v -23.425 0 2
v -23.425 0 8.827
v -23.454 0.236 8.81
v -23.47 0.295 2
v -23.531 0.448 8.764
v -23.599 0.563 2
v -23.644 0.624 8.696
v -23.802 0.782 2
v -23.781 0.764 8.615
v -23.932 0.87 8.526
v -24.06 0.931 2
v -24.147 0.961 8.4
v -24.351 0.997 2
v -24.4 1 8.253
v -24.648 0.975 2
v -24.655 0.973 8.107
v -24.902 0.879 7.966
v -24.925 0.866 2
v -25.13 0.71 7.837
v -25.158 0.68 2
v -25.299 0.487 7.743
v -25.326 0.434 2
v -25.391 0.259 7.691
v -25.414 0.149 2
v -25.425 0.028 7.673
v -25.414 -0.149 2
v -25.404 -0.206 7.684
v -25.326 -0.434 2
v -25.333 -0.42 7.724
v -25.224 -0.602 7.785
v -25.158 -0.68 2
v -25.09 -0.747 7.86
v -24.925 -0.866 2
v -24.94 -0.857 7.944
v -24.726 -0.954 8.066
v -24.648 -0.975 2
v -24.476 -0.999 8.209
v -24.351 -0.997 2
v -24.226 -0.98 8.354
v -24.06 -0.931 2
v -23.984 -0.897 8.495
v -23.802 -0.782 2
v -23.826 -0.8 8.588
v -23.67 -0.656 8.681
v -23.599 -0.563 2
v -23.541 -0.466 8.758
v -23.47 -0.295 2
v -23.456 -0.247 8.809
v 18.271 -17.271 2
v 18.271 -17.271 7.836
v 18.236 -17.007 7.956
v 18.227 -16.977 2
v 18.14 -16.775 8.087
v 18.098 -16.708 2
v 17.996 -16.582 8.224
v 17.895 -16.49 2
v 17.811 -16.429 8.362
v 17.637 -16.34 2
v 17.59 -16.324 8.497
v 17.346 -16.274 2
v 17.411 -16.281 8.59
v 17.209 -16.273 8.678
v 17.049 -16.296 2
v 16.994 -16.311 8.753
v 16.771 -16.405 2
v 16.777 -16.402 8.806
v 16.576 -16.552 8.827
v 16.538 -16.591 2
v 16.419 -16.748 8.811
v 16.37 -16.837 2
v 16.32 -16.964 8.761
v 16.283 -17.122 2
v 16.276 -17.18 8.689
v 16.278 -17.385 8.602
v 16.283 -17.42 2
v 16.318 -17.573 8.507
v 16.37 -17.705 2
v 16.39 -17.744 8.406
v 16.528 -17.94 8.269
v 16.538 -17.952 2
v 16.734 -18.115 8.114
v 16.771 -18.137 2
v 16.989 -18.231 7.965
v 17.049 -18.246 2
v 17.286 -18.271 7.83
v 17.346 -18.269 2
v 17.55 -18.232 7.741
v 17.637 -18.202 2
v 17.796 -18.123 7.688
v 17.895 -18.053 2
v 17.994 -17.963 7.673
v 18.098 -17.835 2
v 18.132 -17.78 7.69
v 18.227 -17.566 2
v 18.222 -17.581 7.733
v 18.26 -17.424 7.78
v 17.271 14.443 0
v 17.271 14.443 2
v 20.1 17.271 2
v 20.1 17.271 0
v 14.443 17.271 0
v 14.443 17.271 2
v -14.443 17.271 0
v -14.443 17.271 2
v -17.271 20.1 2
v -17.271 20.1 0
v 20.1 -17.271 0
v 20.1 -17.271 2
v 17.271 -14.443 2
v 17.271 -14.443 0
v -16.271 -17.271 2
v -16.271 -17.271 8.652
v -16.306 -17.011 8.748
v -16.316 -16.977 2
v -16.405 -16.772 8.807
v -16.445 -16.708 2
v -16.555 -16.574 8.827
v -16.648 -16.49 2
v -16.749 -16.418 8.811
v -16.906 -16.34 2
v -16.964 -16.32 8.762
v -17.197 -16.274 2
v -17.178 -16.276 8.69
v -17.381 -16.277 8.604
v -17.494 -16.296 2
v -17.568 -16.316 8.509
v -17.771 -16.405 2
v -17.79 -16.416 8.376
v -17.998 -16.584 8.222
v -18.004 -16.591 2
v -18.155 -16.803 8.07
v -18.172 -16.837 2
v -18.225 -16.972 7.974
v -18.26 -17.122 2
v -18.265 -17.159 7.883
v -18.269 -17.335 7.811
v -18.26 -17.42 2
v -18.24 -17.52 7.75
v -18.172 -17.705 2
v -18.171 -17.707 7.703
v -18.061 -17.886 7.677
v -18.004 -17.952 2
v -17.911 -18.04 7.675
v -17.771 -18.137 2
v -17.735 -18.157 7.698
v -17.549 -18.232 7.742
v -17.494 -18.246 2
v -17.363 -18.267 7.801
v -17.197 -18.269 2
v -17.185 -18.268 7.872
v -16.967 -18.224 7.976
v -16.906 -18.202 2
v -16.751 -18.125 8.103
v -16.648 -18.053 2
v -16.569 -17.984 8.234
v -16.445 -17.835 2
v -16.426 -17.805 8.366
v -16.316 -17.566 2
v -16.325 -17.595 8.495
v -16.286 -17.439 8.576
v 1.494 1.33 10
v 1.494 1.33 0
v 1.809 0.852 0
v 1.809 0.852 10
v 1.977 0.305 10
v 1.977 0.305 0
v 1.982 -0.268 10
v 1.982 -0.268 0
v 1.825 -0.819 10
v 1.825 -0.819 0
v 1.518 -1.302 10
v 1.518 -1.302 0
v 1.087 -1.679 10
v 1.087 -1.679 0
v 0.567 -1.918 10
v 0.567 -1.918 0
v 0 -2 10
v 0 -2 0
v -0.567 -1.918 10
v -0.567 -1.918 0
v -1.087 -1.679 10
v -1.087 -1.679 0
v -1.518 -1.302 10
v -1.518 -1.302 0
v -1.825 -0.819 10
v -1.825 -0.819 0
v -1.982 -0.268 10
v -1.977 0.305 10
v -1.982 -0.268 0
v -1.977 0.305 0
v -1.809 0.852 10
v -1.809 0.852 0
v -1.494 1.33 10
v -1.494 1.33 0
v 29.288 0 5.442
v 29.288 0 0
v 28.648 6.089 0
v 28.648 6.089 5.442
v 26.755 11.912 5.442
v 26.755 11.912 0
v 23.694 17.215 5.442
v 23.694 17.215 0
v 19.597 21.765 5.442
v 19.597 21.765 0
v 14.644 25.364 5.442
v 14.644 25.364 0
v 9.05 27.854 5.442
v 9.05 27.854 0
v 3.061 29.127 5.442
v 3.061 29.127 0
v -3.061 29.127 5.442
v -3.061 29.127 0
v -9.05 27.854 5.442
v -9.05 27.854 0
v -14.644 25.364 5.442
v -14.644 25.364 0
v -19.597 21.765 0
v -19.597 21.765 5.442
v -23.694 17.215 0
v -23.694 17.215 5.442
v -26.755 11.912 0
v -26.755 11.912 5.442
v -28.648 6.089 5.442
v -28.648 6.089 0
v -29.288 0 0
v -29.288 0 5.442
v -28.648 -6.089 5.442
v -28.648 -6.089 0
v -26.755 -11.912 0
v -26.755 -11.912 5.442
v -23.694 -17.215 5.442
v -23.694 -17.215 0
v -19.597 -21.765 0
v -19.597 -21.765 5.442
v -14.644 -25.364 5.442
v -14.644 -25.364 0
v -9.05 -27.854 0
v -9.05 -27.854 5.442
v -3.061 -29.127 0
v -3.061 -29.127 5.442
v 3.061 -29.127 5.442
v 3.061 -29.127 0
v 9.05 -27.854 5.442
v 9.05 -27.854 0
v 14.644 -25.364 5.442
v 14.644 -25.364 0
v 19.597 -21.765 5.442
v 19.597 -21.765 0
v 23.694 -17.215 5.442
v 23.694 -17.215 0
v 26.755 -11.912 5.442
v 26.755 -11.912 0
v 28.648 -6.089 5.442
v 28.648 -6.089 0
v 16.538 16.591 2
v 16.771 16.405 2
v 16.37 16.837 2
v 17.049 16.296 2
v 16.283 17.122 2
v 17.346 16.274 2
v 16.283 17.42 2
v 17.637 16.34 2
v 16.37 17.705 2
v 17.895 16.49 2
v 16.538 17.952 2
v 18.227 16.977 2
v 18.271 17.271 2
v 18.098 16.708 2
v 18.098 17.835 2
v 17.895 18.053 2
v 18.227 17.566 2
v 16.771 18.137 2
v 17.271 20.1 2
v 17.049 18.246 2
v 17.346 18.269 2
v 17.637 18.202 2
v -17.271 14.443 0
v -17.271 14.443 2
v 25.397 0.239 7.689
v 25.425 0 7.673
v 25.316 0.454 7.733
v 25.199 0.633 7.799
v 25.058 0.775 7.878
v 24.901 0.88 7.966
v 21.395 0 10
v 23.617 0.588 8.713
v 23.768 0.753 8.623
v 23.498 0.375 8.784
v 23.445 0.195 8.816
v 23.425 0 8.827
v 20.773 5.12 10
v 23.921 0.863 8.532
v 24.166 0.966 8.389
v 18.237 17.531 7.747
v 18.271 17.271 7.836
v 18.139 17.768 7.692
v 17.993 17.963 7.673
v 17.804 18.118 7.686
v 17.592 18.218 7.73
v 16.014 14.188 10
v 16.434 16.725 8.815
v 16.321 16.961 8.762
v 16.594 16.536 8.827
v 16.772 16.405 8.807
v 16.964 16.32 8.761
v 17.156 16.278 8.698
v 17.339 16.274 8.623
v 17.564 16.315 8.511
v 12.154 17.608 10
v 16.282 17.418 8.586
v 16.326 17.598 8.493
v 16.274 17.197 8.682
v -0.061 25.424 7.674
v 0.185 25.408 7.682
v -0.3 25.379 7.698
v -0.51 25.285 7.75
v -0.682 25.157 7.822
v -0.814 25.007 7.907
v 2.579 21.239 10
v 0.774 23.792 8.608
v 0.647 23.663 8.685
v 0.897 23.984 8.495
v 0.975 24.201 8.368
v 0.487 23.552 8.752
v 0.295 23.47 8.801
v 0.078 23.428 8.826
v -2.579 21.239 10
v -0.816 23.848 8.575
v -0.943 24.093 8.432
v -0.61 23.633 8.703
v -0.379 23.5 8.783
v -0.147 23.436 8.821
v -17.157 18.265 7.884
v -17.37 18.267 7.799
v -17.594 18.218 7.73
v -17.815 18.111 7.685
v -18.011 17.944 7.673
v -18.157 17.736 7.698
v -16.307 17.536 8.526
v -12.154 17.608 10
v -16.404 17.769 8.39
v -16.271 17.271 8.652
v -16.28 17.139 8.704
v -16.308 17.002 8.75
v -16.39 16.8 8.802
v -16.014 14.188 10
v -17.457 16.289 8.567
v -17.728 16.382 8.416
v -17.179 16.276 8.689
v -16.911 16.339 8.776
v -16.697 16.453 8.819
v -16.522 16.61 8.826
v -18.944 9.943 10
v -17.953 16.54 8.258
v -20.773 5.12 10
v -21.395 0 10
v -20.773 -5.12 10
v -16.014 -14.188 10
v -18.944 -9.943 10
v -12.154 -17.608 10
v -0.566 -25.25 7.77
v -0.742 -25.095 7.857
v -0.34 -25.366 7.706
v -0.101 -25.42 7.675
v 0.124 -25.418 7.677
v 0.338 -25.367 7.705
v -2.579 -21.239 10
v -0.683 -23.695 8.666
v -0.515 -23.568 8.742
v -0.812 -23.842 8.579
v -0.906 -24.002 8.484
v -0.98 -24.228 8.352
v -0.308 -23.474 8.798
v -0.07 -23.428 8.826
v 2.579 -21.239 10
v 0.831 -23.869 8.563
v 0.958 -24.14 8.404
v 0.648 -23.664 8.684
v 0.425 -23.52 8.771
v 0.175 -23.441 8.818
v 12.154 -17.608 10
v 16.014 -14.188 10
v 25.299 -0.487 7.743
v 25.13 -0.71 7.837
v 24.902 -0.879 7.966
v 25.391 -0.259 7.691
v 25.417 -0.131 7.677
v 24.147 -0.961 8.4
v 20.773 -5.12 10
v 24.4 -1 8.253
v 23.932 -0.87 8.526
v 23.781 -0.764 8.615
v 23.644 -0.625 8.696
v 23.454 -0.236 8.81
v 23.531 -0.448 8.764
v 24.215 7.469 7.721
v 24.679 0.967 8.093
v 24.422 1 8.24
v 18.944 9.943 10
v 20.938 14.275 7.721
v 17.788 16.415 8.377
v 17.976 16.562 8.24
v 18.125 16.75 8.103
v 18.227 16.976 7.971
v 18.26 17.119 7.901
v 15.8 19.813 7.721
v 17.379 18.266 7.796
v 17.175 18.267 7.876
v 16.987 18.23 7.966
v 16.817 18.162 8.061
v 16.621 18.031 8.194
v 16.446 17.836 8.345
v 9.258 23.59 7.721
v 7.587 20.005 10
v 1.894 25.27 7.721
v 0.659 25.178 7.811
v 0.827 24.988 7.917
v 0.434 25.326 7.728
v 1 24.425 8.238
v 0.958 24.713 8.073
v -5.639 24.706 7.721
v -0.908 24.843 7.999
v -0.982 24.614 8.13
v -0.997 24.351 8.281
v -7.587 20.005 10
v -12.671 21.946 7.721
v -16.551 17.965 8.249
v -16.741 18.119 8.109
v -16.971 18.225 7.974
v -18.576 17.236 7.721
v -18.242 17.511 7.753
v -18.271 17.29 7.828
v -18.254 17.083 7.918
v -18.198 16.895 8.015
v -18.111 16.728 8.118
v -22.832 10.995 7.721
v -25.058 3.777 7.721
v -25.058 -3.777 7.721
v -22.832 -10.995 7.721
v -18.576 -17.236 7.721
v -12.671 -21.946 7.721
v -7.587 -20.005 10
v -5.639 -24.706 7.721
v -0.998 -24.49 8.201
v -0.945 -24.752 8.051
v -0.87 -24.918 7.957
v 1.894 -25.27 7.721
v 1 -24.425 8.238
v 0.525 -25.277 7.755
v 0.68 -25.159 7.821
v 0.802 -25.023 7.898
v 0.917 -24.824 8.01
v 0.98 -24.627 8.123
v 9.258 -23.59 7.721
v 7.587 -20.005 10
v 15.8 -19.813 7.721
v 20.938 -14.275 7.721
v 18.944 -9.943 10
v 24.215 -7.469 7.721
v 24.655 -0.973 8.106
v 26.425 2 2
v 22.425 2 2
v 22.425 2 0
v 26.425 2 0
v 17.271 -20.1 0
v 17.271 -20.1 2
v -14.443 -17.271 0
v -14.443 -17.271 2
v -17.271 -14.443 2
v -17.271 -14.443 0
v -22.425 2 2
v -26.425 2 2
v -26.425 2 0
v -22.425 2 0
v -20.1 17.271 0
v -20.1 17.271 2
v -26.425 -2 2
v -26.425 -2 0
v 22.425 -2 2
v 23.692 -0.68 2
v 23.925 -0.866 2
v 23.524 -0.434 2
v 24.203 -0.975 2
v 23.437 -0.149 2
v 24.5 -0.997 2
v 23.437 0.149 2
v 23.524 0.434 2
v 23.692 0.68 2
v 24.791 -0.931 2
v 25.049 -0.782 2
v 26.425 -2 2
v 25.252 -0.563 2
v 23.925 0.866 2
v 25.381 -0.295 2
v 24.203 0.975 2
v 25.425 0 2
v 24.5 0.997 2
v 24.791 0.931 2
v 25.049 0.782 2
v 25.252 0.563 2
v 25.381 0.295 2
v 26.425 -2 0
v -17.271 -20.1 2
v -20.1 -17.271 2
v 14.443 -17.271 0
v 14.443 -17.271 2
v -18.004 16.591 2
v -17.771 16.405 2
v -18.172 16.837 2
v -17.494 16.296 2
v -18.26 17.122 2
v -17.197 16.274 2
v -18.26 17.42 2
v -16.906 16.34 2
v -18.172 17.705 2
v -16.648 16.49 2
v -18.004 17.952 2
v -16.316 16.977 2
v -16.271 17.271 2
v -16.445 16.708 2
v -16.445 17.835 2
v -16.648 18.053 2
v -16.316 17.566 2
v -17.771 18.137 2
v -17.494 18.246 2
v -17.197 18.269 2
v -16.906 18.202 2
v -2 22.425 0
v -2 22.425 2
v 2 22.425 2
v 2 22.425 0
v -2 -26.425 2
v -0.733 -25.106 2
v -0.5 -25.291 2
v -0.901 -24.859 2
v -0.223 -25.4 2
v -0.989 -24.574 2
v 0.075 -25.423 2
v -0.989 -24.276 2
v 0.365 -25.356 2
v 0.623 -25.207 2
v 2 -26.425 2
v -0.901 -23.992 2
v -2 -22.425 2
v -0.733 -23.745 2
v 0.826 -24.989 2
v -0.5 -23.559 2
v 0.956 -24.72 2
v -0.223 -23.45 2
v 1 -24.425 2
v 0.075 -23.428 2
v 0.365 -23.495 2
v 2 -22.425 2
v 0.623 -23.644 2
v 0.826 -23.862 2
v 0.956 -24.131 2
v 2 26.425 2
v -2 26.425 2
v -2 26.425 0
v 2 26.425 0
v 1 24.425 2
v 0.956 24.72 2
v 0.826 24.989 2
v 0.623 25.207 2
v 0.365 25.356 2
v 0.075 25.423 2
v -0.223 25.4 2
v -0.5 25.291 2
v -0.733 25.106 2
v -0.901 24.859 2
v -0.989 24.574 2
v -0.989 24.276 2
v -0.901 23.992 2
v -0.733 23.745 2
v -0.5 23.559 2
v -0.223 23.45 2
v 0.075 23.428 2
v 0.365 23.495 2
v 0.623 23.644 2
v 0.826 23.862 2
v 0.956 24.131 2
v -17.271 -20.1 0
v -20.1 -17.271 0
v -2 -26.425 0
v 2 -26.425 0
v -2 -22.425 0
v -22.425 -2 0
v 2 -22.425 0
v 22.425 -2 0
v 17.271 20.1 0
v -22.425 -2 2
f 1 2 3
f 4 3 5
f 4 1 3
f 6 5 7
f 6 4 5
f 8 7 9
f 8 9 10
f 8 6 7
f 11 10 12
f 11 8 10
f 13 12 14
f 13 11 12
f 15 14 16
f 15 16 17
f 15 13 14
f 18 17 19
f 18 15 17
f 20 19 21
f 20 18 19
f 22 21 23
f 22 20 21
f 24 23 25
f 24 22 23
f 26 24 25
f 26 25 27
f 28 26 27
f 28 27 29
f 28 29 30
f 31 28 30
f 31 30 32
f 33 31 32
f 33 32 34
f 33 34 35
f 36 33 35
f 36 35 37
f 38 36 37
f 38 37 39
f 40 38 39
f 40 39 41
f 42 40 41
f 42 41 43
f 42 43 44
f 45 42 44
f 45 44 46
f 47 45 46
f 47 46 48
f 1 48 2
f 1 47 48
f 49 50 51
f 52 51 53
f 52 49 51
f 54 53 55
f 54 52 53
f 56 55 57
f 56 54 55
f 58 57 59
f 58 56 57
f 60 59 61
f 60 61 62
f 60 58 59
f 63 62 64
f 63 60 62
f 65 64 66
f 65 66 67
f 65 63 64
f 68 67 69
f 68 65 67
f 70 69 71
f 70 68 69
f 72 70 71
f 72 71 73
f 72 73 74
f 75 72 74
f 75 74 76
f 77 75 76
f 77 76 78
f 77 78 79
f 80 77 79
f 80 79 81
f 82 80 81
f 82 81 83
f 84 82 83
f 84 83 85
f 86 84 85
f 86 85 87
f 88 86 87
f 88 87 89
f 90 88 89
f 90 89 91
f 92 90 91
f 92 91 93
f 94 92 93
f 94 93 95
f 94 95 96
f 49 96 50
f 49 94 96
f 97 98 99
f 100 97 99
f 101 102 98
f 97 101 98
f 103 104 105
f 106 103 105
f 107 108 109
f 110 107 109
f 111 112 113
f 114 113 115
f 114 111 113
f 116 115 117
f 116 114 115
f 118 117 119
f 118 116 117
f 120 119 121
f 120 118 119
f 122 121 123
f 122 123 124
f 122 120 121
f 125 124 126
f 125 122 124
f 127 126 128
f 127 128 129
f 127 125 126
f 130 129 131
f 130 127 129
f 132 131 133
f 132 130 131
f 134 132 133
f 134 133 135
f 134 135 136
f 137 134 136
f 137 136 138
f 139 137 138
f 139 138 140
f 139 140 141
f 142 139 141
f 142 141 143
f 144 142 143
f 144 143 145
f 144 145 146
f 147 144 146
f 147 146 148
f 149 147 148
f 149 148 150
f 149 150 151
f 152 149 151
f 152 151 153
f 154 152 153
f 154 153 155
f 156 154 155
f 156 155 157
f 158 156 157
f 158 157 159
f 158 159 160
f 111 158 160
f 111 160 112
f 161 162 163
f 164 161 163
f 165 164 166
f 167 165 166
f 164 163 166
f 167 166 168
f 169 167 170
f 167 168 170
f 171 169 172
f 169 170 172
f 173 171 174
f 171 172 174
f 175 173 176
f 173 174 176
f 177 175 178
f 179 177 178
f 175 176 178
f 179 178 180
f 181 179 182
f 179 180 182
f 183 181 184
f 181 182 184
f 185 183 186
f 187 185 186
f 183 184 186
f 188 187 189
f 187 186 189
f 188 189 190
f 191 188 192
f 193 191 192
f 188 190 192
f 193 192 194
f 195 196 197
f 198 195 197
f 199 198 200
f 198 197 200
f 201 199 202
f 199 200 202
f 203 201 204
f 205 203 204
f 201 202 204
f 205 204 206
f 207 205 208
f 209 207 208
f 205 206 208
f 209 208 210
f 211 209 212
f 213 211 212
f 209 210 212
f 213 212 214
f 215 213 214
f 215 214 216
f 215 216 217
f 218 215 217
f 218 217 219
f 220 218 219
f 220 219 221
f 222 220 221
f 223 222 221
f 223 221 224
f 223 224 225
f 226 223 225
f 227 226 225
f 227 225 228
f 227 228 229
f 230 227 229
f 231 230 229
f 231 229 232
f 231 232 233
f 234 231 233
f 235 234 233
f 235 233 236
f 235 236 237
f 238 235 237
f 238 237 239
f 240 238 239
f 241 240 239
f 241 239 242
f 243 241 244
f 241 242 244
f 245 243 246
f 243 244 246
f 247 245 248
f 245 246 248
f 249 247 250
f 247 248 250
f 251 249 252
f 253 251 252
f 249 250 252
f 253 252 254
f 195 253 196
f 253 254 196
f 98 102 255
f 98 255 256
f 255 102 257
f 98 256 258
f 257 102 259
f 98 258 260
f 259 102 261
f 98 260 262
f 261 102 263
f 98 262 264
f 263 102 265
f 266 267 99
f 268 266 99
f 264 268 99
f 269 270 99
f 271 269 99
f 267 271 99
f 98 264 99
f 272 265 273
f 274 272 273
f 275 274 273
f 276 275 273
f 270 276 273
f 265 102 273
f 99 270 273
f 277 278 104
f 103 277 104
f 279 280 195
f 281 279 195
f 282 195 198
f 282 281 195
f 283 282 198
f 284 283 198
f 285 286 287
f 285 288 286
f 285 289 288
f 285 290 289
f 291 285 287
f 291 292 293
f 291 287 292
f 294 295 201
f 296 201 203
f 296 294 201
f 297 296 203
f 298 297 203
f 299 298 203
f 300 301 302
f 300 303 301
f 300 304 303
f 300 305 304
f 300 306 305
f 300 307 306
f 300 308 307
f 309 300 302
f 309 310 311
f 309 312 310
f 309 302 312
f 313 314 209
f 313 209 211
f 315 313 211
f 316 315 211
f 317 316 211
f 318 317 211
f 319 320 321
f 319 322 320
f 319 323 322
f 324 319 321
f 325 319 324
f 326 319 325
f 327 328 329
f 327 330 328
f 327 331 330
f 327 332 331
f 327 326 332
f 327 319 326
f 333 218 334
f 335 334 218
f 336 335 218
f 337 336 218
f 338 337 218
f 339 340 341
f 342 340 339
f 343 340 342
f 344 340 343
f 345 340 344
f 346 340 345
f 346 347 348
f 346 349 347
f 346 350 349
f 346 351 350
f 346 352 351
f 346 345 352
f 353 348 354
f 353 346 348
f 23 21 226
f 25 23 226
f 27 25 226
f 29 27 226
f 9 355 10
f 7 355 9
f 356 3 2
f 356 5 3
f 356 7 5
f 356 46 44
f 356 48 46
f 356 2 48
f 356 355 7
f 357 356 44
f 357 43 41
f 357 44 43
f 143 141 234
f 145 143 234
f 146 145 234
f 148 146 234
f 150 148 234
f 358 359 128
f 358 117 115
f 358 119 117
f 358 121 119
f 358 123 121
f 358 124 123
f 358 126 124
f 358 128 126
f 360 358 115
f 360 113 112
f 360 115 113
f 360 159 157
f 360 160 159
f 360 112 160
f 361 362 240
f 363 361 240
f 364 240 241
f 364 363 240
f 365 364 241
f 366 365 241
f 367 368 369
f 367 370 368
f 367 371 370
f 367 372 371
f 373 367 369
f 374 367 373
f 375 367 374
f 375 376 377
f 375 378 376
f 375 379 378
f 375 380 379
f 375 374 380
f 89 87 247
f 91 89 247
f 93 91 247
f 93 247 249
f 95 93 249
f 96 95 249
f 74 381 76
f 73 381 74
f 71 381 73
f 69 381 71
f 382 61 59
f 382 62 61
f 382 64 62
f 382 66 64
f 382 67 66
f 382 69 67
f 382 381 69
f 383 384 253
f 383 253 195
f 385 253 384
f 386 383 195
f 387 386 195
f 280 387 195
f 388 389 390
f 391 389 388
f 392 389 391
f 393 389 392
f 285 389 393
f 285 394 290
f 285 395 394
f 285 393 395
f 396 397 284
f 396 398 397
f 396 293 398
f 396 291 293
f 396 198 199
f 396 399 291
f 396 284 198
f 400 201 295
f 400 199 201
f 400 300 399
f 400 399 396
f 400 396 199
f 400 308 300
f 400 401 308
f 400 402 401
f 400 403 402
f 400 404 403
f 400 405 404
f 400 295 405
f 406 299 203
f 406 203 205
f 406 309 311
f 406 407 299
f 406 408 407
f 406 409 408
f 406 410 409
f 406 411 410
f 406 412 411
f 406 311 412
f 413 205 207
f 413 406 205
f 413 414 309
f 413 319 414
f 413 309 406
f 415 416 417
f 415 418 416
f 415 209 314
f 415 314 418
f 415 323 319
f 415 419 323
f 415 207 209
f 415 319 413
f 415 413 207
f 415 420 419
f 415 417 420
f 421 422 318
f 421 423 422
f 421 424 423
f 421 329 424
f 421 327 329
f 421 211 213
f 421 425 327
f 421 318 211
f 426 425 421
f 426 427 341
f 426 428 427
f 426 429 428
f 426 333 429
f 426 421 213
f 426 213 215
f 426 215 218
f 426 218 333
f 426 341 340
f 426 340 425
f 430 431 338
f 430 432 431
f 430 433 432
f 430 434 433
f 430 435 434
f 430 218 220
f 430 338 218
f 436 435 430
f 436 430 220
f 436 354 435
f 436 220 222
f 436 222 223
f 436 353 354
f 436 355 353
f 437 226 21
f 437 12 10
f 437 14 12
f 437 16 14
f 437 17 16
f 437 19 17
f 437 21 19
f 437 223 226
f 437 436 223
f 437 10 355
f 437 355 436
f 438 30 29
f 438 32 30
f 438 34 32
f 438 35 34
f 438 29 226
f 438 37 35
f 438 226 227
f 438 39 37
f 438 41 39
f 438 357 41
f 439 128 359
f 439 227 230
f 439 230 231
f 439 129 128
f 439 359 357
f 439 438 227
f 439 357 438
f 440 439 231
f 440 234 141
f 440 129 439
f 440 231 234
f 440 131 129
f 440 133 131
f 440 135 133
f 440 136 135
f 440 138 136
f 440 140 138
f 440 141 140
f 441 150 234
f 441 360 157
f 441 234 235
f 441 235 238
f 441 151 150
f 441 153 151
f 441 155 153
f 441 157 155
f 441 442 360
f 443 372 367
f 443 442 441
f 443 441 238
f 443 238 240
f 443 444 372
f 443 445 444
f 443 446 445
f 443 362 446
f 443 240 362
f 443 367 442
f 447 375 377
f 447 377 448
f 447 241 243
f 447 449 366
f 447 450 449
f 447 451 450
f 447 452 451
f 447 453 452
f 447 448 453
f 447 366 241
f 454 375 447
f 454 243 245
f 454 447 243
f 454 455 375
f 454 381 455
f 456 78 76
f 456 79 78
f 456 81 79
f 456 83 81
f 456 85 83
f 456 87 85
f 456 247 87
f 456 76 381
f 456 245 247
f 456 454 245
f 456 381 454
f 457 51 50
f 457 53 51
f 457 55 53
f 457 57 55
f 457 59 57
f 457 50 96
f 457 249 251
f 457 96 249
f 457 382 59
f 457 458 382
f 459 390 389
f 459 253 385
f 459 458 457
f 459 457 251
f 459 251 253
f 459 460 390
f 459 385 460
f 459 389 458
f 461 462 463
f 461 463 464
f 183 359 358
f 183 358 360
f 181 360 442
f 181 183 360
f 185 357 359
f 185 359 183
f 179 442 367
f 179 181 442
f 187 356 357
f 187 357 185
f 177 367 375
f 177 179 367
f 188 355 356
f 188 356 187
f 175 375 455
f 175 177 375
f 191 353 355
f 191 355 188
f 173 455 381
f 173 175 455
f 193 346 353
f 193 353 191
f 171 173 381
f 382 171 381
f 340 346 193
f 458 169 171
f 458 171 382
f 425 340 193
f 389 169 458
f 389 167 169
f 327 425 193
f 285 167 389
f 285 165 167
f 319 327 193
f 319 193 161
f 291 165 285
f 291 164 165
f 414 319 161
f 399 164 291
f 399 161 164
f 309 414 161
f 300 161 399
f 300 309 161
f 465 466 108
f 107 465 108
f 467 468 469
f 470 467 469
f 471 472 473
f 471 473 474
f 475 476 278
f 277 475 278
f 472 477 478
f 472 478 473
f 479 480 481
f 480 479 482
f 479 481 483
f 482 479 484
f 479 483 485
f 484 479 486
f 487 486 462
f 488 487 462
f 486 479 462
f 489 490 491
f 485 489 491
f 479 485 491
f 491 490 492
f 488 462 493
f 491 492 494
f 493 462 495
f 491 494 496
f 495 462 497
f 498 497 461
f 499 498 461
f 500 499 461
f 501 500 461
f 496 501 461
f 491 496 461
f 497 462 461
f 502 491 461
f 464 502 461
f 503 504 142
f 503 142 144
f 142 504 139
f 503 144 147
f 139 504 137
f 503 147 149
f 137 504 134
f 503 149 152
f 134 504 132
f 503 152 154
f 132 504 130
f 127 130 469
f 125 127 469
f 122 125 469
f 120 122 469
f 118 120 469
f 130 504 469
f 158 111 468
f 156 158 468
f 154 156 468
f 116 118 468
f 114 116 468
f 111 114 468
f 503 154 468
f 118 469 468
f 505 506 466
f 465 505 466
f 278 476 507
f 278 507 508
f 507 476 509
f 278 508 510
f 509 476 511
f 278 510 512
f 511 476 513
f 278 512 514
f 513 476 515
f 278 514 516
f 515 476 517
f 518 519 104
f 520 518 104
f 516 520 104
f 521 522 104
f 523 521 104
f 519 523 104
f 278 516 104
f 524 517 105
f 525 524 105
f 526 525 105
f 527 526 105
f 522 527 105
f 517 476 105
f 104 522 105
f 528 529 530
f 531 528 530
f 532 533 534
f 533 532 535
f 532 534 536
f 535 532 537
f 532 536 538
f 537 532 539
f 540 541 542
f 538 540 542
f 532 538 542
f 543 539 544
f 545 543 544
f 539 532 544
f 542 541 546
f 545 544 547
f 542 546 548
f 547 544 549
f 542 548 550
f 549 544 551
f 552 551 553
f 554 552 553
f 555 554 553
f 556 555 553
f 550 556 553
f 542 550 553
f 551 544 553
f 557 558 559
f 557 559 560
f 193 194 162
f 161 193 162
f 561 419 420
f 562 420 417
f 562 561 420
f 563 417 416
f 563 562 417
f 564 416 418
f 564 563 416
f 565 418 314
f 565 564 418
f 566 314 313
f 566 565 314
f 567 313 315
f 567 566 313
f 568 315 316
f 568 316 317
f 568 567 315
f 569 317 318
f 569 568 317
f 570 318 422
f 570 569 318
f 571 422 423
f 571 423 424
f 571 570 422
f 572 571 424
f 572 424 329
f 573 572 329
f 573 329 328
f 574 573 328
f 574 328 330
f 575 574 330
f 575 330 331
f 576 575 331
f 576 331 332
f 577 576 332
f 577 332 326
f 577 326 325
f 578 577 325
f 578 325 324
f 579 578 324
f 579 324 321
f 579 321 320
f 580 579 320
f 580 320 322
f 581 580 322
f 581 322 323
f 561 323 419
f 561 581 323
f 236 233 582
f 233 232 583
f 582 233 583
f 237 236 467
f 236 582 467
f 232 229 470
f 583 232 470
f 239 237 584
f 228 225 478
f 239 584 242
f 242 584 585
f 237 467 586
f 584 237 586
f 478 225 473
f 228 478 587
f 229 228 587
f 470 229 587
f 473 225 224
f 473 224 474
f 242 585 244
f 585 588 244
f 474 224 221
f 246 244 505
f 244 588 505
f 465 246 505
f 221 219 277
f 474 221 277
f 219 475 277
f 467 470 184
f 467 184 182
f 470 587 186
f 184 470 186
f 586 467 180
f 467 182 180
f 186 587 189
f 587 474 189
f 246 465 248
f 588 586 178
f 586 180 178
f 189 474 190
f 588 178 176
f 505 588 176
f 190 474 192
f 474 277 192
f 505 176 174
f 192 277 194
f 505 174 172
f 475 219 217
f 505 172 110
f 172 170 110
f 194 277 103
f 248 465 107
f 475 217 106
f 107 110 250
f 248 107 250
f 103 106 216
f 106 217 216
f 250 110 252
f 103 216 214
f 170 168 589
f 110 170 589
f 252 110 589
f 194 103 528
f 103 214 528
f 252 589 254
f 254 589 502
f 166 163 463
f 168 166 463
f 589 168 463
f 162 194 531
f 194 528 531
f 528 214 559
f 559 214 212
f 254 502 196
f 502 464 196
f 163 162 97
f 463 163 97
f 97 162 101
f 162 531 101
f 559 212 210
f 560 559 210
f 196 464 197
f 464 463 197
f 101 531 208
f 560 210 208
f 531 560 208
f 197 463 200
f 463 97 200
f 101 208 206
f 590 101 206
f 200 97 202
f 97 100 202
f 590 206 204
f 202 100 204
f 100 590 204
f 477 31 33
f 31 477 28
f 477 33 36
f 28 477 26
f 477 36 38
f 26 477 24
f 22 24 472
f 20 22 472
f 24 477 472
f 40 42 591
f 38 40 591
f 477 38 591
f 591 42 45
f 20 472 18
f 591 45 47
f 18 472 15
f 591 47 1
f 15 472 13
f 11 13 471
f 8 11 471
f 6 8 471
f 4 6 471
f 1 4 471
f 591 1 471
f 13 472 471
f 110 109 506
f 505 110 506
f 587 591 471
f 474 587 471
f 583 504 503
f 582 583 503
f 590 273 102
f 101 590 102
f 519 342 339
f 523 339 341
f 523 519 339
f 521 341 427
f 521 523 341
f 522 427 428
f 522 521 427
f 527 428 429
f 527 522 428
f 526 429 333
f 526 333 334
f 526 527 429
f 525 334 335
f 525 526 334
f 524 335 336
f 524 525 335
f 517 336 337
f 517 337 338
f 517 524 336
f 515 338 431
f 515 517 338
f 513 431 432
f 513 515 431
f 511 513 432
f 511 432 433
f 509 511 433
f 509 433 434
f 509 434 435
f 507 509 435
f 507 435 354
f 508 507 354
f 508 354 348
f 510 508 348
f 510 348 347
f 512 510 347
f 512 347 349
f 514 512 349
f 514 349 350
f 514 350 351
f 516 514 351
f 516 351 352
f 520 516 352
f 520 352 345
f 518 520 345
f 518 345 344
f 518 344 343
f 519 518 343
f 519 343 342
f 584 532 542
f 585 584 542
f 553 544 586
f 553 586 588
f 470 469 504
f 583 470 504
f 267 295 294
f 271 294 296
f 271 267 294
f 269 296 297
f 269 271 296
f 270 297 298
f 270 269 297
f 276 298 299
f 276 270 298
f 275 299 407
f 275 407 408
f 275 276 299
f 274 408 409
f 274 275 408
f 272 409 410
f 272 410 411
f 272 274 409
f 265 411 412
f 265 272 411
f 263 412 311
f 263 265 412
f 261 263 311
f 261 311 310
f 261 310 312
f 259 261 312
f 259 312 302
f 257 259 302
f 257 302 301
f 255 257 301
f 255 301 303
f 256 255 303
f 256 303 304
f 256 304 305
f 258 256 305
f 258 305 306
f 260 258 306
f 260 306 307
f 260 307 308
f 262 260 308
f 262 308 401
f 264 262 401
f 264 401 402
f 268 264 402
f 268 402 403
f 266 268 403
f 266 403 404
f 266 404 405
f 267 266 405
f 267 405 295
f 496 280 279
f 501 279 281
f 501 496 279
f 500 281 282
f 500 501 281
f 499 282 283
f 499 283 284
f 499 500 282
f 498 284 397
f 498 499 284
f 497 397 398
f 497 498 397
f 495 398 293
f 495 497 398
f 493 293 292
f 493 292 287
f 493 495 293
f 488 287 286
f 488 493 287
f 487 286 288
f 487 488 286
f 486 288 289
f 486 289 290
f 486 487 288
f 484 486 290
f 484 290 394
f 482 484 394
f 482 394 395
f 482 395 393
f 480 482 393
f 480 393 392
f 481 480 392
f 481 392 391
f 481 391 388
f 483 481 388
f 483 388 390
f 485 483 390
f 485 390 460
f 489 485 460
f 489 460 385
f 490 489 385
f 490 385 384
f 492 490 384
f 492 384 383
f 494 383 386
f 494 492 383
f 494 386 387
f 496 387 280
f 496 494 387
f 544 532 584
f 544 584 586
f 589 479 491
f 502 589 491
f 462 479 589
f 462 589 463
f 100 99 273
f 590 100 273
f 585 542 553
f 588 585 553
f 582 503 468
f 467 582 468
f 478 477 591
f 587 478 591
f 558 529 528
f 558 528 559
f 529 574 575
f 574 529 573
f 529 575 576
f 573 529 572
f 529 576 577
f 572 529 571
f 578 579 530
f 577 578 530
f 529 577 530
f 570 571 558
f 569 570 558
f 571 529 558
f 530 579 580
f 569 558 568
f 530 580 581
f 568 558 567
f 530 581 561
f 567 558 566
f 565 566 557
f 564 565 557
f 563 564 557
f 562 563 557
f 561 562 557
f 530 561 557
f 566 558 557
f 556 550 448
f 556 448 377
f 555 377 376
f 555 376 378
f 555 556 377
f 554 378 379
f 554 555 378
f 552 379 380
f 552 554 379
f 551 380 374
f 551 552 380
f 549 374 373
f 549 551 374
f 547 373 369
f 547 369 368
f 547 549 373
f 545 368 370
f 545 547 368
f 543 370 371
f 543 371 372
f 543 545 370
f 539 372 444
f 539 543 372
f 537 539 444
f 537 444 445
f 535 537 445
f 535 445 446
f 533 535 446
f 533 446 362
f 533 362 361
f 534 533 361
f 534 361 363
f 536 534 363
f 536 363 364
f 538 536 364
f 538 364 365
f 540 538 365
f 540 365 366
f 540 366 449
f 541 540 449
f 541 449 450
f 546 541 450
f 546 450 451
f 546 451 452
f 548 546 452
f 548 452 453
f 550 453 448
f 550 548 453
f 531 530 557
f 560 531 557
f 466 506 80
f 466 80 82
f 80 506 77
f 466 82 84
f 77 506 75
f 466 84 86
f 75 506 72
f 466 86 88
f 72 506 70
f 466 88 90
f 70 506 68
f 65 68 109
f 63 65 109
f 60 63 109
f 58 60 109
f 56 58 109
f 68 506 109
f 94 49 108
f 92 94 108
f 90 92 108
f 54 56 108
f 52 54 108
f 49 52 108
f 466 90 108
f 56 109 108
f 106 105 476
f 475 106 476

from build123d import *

# Parameters (mm, degrees)
F0_R     = 29.287505
F0_R_2   = 1
F1_DEPTH = 10
F4_W     = 4
F4_H     = 4
F4_R     = 1
F5_DEPTH = 2


# Not quite as in the source:
# - a fillet or chamfer that OpenCascade refuses, or shapes differently, is made with other operations: its cross-section is extruded or revolved along the edge and cut away or added


with BuildPart() as f1:
    # F0 (on Top) → F1 (new body)
    with BuildSketch(Plane.XY):
        Circle(F0_R)
        with Locations((-17.2713695087, -17.2713695087)):
            Circle(F0_R_2, mode=Mode.SUBTRACT)
        with Locations((0, -24.425405)):
            Circle(F0_R_2, mode=Mode.SUBTRACT)
        with Locations((-24.425405, 0)):
            Circle(F0_R_2, mode=Mode.SUBTRACT)
        with BuildLine():
            ThreePointArc((1.4936867141, 1.33), (0, -2), (-1.4936867141, 1.33))
            Line((-1.4936867141, 1.33), (1.4936867141, 1.33))
        make_face(mode=Mode.SUBTRACT)
        with Locations((17.2713695087, -17.2713695087)):
            Circle(F0_R_2, mode=Mode.SUBTRACT)
        with Locations((24.425405, 0)):
            Circle(F0_R_2, mode=Mode.SUBTRACT)
        with Locations((-17.2713695087, 17.2713695087)):
            Circle(F0_R_2, mode=Mode.SUBTRACT)
        with Locations((0, 24.425405)):
            Circle(F0_R_2, mode=Mode.SUBTRACT)
        with Locations((17.2713695087, 17.2713695087)):
            Circle(F0_R_2, mode=Mode.SUBTRACT)
    extrude(amount=F1_DEPTH)

    # F2: chamfer of 7.89245 x 4.55783 on 1 edges, made by hand

    # F2_s1 → F2_t2 (revolve, cut)
    with BuildSketch(Plane.XZ):
        Polygon((29.287505, 5.44217), (21.395055, 10), (29.287505, 10), align=None)
    revolve(axis=Axis((0, 0, 10), (0, 0, 1)), mode=Mode.SUBTRACT)

    # F4 (on offset) → F5 (cut)
    with BuildSketch(Plane.XY.offset(2)):
        with Locations((0, -24.425405)):
            Rectangle(F4_W, F4_H)
        with Locations((0, -24.425405)):
            Circle(F4_R, mode=Mode.SUBTRACT)
        Polygon((-20.0997966335, -17.2713695087), (-17.2713695087, -20.0997966335), (-14.442942384, -17.2713695087), (-17.2713695087, -14.442942384), align=None)
        Polygon((17.2713695087, -20.0997966335), (20.0997966335, -17.2713695087), (17.2713695087, -14.442942384), (14.442942384, -17.2713695087), align=None)
        with Locations((-24.425405, 0)):
            Rectangle(F4_W, F4_H)
        with Locations((24.425405, 0)):
            Rectangle(F4_W, F4_H)
        Polygon((-17.2713695087, 20.0997966335), (-20.0997966335, 17.2713695087), (-17.2713695087, 14.442942384), (-14.442942384, 17.2713695087), align=None)
        Polygon((20.0997966335, 17.2713695087), (17.2713695087, 20.0997966335), (14.442942384, 17.2713695087), (17.2713695087, 14.442942384), align=None)
        with Locations((0, 24.425405)):
            Rectangle(F4_W, F4_H)
        with Locations((0, -24.425405)):
            Circle(F4_R)
    extrude(amount=-F5_DEPTH, mode=Mode.SUBTRACT)


solid = f1.part
